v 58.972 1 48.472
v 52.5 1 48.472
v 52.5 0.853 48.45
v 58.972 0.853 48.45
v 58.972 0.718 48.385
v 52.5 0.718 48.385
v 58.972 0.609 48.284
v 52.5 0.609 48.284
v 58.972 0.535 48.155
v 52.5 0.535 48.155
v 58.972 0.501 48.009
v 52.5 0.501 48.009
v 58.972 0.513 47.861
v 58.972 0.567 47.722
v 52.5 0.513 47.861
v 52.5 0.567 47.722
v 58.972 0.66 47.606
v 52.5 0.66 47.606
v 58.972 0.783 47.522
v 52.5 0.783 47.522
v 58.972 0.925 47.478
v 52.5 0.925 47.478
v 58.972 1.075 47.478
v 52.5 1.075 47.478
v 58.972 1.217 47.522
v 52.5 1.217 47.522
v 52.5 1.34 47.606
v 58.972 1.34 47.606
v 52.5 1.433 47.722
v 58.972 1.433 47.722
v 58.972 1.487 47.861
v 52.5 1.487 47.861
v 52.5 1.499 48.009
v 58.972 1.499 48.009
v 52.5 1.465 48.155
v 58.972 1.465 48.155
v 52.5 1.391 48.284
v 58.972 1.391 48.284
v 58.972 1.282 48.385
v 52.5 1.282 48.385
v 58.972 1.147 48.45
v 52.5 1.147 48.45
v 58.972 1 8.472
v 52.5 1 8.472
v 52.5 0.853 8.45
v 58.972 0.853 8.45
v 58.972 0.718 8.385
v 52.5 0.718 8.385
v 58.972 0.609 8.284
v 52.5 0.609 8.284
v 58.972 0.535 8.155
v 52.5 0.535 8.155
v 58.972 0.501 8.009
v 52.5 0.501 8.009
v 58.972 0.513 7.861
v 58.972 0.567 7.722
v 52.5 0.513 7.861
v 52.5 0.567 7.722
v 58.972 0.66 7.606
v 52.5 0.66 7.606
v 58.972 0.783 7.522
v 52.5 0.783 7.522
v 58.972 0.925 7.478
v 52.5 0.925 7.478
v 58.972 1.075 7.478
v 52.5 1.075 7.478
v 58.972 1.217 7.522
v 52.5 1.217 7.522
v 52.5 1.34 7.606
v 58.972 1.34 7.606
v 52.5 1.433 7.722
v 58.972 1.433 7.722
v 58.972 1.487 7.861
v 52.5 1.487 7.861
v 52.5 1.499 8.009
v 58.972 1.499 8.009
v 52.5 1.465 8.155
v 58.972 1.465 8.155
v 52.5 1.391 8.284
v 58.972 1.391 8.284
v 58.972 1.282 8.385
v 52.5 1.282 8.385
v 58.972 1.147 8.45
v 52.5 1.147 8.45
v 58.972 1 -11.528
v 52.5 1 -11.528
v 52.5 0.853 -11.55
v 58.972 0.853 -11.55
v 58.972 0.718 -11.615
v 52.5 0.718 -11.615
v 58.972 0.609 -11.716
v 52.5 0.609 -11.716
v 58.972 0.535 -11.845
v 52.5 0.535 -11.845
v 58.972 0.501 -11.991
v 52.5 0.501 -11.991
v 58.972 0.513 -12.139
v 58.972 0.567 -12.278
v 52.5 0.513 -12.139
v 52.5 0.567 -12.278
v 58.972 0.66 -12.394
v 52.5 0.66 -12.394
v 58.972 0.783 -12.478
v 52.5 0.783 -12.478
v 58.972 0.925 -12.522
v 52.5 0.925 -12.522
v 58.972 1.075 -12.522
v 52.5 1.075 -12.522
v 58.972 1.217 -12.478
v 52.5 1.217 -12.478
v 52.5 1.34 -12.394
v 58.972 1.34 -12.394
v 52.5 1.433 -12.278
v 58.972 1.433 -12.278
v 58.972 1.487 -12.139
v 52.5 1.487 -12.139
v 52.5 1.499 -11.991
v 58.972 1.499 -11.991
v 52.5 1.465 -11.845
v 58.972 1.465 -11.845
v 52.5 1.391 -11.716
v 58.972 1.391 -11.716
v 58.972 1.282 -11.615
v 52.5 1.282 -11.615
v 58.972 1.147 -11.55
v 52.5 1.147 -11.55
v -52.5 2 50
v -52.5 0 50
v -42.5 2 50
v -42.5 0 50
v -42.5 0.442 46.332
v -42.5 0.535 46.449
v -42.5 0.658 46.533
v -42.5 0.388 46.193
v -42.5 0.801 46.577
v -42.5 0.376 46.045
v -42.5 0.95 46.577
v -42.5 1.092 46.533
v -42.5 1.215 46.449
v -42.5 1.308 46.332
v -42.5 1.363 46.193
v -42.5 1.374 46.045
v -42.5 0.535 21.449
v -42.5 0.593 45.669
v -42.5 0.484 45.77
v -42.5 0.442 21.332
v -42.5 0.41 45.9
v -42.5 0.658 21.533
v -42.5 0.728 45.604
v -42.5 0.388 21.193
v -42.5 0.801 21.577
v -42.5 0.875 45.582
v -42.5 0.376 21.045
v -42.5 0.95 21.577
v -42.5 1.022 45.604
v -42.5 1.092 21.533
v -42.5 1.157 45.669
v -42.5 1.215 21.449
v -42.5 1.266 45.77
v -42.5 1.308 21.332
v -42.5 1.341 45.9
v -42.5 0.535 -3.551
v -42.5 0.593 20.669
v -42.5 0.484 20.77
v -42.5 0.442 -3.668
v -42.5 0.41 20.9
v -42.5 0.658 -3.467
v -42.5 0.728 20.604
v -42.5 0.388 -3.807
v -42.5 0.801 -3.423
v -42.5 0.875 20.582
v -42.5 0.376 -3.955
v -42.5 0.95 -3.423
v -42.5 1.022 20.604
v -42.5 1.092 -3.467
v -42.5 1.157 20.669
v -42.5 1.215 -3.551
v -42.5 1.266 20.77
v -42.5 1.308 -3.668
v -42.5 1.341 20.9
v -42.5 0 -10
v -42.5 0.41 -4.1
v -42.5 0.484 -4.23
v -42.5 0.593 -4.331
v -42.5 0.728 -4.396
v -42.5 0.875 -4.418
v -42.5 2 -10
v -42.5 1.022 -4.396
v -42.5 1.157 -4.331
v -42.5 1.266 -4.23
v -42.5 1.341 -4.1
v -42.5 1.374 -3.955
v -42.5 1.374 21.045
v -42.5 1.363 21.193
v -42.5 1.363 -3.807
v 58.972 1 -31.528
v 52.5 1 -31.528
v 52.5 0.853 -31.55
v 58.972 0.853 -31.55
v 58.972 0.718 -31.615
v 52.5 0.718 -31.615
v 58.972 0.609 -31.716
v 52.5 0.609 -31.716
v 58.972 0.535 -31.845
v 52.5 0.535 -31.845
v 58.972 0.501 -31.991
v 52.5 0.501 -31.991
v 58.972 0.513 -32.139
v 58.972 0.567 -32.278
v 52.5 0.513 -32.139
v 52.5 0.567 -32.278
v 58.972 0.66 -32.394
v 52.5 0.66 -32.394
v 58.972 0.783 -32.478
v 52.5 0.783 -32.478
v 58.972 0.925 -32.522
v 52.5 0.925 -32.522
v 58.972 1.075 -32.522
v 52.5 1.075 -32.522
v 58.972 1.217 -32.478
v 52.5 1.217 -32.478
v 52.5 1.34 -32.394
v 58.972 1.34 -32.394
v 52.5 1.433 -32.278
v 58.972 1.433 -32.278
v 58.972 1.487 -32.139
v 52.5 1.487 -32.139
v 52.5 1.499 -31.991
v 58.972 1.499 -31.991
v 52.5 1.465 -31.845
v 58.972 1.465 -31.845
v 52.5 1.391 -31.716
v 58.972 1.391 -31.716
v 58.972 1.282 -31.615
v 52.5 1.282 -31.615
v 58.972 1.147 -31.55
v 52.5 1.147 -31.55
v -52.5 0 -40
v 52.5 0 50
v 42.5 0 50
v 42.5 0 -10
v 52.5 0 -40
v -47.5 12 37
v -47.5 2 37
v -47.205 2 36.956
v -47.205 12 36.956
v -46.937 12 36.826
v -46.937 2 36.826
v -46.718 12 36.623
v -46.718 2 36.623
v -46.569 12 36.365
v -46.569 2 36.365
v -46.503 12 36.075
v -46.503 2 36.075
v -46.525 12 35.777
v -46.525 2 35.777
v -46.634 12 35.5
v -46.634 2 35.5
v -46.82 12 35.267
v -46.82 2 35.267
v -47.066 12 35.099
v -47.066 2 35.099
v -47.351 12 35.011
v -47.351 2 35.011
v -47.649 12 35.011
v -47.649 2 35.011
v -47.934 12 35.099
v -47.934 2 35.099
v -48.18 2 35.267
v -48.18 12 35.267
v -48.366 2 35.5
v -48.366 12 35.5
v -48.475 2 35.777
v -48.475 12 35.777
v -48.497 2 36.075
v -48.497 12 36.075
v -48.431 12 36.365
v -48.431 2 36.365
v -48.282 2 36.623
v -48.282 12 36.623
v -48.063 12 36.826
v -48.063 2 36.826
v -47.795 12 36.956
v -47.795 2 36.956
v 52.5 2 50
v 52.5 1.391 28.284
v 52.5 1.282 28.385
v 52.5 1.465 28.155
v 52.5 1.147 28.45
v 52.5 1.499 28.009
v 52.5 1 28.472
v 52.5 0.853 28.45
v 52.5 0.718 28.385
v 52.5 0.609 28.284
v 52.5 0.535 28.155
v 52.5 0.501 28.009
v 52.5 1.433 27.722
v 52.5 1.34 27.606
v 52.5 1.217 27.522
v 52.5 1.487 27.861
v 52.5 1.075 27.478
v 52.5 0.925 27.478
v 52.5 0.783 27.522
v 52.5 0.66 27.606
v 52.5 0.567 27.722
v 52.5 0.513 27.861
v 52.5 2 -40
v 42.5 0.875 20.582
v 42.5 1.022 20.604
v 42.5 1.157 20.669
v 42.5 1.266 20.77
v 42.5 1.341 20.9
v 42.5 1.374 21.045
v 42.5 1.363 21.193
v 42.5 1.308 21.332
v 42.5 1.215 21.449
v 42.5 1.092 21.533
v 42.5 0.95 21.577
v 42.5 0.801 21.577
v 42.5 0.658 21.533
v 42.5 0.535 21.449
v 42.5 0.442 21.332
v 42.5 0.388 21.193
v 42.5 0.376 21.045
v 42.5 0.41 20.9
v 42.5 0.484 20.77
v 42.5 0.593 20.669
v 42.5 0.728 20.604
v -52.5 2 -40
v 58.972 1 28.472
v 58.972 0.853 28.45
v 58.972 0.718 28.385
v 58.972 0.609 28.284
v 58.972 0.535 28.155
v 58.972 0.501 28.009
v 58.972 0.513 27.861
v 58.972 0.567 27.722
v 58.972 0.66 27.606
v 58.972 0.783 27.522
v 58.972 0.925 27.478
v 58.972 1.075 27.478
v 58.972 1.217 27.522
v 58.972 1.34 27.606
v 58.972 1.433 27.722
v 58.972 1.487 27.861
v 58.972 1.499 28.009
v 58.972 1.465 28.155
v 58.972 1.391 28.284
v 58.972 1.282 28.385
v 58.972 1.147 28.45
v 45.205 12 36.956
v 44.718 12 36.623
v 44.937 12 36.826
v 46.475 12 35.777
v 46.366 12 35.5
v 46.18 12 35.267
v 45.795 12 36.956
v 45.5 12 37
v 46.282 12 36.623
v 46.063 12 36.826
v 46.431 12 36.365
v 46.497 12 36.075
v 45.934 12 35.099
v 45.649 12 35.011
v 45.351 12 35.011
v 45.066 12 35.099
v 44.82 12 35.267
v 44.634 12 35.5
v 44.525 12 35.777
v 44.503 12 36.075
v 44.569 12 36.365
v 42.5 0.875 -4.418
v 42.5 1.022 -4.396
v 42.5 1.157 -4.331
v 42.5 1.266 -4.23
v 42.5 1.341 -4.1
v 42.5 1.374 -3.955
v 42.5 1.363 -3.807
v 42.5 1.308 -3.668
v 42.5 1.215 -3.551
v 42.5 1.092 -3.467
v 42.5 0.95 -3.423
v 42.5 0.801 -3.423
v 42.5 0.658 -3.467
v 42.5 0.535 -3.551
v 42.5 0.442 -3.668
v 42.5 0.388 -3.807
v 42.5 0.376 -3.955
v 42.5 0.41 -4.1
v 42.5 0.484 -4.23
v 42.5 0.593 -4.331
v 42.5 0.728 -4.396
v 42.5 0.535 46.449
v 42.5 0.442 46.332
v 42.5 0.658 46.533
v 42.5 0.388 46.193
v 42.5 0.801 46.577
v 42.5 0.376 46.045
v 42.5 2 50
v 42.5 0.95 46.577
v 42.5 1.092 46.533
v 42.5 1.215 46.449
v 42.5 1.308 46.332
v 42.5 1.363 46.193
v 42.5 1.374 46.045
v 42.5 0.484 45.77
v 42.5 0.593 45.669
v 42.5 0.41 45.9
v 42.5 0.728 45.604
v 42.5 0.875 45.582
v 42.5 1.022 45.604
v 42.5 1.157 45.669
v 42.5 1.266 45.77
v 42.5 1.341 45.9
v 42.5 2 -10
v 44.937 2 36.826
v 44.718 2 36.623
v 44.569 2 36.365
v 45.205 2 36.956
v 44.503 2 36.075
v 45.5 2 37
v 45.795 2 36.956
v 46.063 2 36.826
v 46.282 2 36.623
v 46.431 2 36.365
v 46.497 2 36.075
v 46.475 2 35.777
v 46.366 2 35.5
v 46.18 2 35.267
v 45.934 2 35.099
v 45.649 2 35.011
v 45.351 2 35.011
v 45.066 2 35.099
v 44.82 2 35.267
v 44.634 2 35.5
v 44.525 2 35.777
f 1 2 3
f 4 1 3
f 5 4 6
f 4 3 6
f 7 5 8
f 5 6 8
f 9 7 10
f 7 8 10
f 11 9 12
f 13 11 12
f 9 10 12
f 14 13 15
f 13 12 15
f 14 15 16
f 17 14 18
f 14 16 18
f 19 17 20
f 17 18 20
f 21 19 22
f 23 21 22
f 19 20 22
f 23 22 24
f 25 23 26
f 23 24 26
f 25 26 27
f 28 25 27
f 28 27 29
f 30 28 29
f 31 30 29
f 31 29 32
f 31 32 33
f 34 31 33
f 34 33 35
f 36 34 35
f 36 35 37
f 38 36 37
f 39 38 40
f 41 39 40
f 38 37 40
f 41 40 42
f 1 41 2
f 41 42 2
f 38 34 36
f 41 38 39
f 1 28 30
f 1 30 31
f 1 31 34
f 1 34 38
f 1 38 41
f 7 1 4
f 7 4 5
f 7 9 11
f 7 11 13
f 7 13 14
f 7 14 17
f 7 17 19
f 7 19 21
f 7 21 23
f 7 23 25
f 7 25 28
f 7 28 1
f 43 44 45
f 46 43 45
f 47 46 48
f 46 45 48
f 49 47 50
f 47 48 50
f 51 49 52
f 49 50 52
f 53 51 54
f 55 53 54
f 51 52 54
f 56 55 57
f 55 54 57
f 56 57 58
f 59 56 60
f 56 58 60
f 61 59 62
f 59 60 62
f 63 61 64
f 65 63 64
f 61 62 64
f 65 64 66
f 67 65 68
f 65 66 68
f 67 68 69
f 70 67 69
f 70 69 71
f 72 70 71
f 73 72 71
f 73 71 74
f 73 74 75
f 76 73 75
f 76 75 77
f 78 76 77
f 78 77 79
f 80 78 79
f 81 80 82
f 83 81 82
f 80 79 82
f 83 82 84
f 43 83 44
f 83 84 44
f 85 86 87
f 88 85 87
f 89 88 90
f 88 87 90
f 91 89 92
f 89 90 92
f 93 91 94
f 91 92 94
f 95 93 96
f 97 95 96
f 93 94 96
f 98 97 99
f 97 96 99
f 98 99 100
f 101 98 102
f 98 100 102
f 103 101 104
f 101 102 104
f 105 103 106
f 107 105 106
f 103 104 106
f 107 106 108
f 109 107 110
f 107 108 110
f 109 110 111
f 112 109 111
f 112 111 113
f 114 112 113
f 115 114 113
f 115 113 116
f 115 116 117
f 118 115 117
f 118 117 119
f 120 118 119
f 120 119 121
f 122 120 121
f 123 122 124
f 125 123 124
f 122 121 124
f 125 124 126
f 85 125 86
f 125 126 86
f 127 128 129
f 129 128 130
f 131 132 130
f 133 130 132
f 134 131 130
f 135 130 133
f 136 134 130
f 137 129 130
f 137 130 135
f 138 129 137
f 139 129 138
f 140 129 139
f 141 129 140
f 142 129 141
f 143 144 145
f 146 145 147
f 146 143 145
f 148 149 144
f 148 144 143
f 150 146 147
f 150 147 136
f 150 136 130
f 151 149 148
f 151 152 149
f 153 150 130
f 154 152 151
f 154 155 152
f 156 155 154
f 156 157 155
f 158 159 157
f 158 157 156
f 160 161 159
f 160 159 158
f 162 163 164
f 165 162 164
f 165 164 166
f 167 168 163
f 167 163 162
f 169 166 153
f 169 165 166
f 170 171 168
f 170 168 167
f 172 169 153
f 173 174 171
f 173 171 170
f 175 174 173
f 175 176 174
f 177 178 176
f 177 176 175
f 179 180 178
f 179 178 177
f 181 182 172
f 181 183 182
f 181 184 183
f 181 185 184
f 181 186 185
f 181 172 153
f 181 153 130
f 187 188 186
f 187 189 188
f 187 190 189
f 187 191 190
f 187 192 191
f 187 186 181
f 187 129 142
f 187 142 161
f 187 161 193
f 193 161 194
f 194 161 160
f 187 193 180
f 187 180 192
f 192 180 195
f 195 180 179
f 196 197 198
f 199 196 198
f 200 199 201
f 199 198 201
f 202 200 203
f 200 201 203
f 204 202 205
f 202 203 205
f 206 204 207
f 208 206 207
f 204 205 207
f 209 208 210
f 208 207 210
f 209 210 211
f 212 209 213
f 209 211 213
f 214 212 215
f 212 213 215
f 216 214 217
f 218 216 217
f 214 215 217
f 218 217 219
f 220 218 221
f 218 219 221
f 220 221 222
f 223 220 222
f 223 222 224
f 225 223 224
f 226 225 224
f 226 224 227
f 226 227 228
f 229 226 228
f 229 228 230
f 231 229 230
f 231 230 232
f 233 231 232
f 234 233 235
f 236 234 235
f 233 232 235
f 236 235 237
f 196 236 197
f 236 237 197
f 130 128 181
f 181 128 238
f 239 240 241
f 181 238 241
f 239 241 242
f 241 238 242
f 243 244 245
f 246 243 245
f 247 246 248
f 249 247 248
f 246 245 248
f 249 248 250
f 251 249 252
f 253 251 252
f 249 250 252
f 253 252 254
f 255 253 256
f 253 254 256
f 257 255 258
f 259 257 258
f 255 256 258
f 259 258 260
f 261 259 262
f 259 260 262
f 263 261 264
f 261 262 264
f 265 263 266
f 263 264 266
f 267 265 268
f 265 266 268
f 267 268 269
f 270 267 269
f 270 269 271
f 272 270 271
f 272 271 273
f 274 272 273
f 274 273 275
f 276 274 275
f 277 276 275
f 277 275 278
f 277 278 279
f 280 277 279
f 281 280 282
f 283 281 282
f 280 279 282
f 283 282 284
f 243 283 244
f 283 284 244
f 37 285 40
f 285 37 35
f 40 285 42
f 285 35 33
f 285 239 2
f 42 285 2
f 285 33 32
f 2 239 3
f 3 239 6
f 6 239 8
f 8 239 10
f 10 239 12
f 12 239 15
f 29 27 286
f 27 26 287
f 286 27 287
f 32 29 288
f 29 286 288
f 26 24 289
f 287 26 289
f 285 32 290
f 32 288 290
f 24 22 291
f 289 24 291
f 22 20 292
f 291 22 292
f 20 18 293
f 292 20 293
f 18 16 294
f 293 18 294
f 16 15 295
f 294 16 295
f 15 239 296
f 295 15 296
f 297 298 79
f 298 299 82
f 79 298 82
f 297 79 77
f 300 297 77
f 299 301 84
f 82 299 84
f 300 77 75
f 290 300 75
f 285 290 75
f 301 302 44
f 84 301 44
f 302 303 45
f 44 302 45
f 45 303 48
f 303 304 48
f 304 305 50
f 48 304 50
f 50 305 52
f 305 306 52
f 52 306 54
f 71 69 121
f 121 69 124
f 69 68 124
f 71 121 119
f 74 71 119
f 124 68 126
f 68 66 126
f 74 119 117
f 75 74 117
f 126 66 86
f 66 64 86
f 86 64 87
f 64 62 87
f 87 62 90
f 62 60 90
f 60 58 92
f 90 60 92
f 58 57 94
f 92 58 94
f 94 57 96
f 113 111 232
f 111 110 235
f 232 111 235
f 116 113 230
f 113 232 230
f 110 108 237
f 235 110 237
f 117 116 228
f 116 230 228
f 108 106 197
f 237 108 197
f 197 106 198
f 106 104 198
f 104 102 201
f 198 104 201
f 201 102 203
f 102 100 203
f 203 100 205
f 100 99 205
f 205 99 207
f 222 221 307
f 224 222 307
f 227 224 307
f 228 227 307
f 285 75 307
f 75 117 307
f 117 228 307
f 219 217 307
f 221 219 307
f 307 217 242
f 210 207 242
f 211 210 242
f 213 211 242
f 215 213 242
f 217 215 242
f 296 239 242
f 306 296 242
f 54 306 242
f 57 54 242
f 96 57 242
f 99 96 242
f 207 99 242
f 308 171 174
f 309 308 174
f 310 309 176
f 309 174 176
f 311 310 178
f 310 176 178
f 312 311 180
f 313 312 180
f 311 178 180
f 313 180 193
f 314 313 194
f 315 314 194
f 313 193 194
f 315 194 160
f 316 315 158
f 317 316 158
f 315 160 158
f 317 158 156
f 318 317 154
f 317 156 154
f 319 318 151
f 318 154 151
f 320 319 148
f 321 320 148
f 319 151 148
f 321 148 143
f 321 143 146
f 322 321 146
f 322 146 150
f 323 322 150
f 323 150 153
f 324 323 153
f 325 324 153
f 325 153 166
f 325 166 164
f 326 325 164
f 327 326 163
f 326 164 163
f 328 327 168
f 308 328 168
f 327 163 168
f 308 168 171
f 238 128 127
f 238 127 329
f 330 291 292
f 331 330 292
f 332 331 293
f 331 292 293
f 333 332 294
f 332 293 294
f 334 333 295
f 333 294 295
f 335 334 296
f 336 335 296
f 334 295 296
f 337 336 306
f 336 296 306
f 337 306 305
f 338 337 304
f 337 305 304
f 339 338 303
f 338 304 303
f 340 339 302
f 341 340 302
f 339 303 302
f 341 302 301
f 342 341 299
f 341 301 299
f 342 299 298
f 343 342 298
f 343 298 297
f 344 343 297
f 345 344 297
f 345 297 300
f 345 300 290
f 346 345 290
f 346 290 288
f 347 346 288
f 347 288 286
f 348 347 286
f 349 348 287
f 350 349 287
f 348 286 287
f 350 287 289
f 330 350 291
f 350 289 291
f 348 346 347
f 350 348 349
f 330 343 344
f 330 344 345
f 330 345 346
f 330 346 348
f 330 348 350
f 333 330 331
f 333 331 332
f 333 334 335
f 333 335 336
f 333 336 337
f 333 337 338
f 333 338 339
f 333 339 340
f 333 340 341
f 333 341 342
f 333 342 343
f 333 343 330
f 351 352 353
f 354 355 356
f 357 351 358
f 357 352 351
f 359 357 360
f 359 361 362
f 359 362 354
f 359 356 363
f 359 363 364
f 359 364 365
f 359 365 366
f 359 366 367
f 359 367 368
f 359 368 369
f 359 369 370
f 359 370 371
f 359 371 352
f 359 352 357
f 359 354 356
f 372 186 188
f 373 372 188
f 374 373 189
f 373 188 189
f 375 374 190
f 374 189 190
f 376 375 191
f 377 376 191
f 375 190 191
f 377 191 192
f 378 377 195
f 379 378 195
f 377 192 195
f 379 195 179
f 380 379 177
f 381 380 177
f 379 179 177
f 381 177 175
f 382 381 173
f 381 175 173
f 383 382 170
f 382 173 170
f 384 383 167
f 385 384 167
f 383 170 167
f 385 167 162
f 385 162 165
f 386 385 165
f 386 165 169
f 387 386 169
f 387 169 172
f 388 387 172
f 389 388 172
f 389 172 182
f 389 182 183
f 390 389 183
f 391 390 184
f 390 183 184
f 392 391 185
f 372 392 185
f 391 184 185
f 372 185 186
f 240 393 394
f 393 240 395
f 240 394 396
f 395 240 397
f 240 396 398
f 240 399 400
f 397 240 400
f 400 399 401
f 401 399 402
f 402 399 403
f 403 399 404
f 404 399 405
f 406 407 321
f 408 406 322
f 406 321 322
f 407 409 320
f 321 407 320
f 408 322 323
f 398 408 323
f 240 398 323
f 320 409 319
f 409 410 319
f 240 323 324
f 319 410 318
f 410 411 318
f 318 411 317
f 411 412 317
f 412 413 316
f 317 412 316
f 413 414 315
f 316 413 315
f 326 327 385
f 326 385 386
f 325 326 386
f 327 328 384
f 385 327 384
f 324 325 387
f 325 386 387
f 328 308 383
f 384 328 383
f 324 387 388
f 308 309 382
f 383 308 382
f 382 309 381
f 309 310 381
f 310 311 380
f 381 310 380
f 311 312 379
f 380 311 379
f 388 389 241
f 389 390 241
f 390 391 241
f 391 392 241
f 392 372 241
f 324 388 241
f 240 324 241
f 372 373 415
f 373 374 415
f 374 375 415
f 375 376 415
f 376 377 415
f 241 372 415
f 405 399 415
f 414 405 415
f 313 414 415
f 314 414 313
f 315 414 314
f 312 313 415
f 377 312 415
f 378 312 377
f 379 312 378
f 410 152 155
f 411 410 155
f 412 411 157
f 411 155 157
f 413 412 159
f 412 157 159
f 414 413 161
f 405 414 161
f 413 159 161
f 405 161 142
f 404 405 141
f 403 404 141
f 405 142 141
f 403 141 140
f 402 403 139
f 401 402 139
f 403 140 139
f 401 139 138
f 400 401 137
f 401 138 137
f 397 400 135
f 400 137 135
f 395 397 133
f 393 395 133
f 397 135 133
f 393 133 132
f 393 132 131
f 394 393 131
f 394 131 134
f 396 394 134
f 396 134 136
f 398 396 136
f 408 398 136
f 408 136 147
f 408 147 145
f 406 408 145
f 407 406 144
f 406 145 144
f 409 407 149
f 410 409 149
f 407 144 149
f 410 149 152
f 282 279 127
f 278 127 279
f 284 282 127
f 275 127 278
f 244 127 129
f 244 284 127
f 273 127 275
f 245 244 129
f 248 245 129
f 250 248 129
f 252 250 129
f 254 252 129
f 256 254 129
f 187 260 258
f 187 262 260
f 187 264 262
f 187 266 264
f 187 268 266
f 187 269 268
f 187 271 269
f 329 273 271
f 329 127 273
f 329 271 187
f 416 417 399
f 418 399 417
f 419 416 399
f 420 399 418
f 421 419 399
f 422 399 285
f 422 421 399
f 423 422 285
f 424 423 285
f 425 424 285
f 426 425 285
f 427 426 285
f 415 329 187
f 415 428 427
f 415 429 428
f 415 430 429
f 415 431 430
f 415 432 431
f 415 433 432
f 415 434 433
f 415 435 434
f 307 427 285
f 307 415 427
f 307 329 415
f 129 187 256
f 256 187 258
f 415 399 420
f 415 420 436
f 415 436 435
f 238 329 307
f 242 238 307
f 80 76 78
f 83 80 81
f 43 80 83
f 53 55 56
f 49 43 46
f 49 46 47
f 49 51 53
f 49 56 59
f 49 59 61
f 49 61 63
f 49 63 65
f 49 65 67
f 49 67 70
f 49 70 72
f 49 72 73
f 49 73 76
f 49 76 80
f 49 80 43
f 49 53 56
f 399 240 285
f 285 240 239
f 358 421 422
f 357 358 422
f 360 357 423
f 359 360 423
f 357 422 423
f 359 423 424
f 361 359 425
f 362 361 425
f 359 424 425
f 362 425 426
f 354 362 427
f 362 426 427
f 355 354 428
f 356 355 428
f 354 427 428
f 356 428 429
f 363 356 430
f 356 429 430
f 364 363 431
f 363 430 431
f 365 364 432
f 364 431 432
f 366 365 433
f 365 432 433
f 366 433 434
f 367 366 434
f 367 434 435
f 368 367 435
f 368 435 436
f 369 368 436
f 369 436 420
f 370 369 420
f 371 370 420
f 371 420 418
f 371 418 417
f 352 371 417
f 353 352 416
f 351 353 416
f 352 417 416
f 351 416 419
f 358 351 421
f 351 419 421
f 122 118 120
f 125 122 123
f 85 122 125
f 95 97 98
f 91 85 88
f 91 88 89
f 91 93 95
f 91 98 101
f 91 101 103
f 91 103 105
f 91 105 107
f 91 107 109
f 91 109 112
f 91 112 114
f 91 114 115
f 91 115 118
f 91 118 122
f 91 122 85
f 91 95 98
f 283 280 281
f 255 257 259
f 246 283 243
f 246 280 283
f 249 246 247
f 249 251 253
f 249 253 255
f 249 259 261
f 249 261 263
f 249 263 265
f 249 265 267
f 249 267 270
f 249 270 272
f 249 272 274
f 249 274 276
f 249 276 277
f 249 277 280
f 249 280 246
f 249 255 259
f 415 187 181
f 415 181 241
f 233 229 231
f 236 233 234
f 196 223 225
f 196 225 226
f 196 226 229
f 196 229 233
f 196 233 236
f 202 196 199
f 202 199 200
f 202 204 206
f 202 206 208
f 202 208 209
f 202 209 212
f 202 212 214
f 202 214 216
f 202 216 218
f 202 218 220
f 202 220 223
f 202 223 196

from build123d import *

# Parameters (mm, degrees)
SKETCH_1_W          = 105
SKETCH_1_H          = 100
EXTRUDE_1_DEPTH     = 2
SKETCH_2_W          = 85
SKETCH_2_H          = 60
CUT_EXTRUDE_1_DEPTH = 2
SKETCH_4_R          = 1
EXTRUDE_2_DEPTH     = 10
SKETCH_5_W          = 105
SKETCH_5_H          = 10
CUT_EXTRUDE_2_DEPTH = 10
SKETCH_7_R          = 0.5
EXTRUDE_3_DEPTH     = 6.4724949
SKETCH_8_R          = 0.5
EXTRUDE_4_DEPTH     = 85


with BuildPart() as part:
    # 스케치1 → 보스-돌출1 (new body)
    with BuildSketch(Plane(origin=(0, 0, 0), x_dir=(1, 0, 0), z_dir=(0, 1, 0))):
        Rectangle(SKETCH_1_W, SKETCH_1_H)
    extrude(amount=EXTRUDE_1_DEPTH)

    # 스케치2 → 컷-돌출1 (cut)
    with BuildSketch(Plane(origin=(0, 2, 0), x_dir=(1, 0, 0), z_dir=(0, 1, 0))):
        with Locations((0, -20)):
            Rectangle(SKETCH_2_W, SKETCH_2_H)
    extrude(amount=-CUT_EXTRUDE_1_DEPTH, mode=Mode.SUBTRACT)

    # 스케치4 → 보스-돌출2 (add)
    with BuildSketch(Plane(origin=(0, 2, 0), x_dir=(1, 0, 0), z_dir=(0, 1, 0))):
        with Locations(Location((45.5, -36, 0), (0, 0, 270))):
            Circle(SKETCH_4_R)
        with Locations(Location((-47.5, -36, 0), (0, 0, 270))):
            Circle(SKETCH_4_R)
    extrude(amount=EXTRUDE_2_DEPTH)

    # 스케치5 → 컷-돌출2 (cut)
    with BuildSketch(Plane(origin=(0, 2, 0), x_dir=(1, 0, 0), z_dir=(0, 1, 0))):
        with Locations((0, 45)):
            Rectangle(SKETCH_5_W, SKETCH_5_H)
    extrude(amount=-CUT_EXTRUDE_2_DEPTH, mode=Mode.SUBTRACT)

    # 스케치7 → 보스-돌출3 (add)
    with BuildSketch(Plane(origin=(52.5, 0, 0), x_dir=(0, 0, -1), z_dir=(1, 0, 0))):
        with Locations(Location((-47.972067637, 1, 0), (0, 0, 180))):
            Circle(SKETCH_7_R)
        with Locations(Location((-27.972067637, 1, 0), (0, 0, 180))):
            Circle(SKETCH_7_R)
        with Locations(Location((-7.972067637, 1, 0), (0, 0, 180))):
            Circle(SKETCH_7_R)
        with Locations(Location((12.027932363, 1, 0), (0, 0, 180))):
            Circle(SKETCH_7_R)
        with Locations(Location((32.027932363, 1, 0), (0, 0, 180))):
            Circle(SKETCH_7_R)
    extrude(amount=EXTRUDE_3_DEPTH)

    # 스케치8 → 보스-돌출4 (add)
    with BuildSketch(Plane(origin=(-42.5, 0, 0), x_dir=(0, 0, -1), z_dir=(1, 0, 0))):
        with Locations((-46.082216043, 0.875077013)):
            Circle(SKETCH_8_R)
        with Locations((-21.082216043, 0.875077013)):
            Circle(SKETCH_8_R)
        with Locations((3.917783957, 0.875077013)):
            Circle(SKETCH_8_R)
    extrude(amount=EXTRUDE_4_DEPTH)


solid = part.part
